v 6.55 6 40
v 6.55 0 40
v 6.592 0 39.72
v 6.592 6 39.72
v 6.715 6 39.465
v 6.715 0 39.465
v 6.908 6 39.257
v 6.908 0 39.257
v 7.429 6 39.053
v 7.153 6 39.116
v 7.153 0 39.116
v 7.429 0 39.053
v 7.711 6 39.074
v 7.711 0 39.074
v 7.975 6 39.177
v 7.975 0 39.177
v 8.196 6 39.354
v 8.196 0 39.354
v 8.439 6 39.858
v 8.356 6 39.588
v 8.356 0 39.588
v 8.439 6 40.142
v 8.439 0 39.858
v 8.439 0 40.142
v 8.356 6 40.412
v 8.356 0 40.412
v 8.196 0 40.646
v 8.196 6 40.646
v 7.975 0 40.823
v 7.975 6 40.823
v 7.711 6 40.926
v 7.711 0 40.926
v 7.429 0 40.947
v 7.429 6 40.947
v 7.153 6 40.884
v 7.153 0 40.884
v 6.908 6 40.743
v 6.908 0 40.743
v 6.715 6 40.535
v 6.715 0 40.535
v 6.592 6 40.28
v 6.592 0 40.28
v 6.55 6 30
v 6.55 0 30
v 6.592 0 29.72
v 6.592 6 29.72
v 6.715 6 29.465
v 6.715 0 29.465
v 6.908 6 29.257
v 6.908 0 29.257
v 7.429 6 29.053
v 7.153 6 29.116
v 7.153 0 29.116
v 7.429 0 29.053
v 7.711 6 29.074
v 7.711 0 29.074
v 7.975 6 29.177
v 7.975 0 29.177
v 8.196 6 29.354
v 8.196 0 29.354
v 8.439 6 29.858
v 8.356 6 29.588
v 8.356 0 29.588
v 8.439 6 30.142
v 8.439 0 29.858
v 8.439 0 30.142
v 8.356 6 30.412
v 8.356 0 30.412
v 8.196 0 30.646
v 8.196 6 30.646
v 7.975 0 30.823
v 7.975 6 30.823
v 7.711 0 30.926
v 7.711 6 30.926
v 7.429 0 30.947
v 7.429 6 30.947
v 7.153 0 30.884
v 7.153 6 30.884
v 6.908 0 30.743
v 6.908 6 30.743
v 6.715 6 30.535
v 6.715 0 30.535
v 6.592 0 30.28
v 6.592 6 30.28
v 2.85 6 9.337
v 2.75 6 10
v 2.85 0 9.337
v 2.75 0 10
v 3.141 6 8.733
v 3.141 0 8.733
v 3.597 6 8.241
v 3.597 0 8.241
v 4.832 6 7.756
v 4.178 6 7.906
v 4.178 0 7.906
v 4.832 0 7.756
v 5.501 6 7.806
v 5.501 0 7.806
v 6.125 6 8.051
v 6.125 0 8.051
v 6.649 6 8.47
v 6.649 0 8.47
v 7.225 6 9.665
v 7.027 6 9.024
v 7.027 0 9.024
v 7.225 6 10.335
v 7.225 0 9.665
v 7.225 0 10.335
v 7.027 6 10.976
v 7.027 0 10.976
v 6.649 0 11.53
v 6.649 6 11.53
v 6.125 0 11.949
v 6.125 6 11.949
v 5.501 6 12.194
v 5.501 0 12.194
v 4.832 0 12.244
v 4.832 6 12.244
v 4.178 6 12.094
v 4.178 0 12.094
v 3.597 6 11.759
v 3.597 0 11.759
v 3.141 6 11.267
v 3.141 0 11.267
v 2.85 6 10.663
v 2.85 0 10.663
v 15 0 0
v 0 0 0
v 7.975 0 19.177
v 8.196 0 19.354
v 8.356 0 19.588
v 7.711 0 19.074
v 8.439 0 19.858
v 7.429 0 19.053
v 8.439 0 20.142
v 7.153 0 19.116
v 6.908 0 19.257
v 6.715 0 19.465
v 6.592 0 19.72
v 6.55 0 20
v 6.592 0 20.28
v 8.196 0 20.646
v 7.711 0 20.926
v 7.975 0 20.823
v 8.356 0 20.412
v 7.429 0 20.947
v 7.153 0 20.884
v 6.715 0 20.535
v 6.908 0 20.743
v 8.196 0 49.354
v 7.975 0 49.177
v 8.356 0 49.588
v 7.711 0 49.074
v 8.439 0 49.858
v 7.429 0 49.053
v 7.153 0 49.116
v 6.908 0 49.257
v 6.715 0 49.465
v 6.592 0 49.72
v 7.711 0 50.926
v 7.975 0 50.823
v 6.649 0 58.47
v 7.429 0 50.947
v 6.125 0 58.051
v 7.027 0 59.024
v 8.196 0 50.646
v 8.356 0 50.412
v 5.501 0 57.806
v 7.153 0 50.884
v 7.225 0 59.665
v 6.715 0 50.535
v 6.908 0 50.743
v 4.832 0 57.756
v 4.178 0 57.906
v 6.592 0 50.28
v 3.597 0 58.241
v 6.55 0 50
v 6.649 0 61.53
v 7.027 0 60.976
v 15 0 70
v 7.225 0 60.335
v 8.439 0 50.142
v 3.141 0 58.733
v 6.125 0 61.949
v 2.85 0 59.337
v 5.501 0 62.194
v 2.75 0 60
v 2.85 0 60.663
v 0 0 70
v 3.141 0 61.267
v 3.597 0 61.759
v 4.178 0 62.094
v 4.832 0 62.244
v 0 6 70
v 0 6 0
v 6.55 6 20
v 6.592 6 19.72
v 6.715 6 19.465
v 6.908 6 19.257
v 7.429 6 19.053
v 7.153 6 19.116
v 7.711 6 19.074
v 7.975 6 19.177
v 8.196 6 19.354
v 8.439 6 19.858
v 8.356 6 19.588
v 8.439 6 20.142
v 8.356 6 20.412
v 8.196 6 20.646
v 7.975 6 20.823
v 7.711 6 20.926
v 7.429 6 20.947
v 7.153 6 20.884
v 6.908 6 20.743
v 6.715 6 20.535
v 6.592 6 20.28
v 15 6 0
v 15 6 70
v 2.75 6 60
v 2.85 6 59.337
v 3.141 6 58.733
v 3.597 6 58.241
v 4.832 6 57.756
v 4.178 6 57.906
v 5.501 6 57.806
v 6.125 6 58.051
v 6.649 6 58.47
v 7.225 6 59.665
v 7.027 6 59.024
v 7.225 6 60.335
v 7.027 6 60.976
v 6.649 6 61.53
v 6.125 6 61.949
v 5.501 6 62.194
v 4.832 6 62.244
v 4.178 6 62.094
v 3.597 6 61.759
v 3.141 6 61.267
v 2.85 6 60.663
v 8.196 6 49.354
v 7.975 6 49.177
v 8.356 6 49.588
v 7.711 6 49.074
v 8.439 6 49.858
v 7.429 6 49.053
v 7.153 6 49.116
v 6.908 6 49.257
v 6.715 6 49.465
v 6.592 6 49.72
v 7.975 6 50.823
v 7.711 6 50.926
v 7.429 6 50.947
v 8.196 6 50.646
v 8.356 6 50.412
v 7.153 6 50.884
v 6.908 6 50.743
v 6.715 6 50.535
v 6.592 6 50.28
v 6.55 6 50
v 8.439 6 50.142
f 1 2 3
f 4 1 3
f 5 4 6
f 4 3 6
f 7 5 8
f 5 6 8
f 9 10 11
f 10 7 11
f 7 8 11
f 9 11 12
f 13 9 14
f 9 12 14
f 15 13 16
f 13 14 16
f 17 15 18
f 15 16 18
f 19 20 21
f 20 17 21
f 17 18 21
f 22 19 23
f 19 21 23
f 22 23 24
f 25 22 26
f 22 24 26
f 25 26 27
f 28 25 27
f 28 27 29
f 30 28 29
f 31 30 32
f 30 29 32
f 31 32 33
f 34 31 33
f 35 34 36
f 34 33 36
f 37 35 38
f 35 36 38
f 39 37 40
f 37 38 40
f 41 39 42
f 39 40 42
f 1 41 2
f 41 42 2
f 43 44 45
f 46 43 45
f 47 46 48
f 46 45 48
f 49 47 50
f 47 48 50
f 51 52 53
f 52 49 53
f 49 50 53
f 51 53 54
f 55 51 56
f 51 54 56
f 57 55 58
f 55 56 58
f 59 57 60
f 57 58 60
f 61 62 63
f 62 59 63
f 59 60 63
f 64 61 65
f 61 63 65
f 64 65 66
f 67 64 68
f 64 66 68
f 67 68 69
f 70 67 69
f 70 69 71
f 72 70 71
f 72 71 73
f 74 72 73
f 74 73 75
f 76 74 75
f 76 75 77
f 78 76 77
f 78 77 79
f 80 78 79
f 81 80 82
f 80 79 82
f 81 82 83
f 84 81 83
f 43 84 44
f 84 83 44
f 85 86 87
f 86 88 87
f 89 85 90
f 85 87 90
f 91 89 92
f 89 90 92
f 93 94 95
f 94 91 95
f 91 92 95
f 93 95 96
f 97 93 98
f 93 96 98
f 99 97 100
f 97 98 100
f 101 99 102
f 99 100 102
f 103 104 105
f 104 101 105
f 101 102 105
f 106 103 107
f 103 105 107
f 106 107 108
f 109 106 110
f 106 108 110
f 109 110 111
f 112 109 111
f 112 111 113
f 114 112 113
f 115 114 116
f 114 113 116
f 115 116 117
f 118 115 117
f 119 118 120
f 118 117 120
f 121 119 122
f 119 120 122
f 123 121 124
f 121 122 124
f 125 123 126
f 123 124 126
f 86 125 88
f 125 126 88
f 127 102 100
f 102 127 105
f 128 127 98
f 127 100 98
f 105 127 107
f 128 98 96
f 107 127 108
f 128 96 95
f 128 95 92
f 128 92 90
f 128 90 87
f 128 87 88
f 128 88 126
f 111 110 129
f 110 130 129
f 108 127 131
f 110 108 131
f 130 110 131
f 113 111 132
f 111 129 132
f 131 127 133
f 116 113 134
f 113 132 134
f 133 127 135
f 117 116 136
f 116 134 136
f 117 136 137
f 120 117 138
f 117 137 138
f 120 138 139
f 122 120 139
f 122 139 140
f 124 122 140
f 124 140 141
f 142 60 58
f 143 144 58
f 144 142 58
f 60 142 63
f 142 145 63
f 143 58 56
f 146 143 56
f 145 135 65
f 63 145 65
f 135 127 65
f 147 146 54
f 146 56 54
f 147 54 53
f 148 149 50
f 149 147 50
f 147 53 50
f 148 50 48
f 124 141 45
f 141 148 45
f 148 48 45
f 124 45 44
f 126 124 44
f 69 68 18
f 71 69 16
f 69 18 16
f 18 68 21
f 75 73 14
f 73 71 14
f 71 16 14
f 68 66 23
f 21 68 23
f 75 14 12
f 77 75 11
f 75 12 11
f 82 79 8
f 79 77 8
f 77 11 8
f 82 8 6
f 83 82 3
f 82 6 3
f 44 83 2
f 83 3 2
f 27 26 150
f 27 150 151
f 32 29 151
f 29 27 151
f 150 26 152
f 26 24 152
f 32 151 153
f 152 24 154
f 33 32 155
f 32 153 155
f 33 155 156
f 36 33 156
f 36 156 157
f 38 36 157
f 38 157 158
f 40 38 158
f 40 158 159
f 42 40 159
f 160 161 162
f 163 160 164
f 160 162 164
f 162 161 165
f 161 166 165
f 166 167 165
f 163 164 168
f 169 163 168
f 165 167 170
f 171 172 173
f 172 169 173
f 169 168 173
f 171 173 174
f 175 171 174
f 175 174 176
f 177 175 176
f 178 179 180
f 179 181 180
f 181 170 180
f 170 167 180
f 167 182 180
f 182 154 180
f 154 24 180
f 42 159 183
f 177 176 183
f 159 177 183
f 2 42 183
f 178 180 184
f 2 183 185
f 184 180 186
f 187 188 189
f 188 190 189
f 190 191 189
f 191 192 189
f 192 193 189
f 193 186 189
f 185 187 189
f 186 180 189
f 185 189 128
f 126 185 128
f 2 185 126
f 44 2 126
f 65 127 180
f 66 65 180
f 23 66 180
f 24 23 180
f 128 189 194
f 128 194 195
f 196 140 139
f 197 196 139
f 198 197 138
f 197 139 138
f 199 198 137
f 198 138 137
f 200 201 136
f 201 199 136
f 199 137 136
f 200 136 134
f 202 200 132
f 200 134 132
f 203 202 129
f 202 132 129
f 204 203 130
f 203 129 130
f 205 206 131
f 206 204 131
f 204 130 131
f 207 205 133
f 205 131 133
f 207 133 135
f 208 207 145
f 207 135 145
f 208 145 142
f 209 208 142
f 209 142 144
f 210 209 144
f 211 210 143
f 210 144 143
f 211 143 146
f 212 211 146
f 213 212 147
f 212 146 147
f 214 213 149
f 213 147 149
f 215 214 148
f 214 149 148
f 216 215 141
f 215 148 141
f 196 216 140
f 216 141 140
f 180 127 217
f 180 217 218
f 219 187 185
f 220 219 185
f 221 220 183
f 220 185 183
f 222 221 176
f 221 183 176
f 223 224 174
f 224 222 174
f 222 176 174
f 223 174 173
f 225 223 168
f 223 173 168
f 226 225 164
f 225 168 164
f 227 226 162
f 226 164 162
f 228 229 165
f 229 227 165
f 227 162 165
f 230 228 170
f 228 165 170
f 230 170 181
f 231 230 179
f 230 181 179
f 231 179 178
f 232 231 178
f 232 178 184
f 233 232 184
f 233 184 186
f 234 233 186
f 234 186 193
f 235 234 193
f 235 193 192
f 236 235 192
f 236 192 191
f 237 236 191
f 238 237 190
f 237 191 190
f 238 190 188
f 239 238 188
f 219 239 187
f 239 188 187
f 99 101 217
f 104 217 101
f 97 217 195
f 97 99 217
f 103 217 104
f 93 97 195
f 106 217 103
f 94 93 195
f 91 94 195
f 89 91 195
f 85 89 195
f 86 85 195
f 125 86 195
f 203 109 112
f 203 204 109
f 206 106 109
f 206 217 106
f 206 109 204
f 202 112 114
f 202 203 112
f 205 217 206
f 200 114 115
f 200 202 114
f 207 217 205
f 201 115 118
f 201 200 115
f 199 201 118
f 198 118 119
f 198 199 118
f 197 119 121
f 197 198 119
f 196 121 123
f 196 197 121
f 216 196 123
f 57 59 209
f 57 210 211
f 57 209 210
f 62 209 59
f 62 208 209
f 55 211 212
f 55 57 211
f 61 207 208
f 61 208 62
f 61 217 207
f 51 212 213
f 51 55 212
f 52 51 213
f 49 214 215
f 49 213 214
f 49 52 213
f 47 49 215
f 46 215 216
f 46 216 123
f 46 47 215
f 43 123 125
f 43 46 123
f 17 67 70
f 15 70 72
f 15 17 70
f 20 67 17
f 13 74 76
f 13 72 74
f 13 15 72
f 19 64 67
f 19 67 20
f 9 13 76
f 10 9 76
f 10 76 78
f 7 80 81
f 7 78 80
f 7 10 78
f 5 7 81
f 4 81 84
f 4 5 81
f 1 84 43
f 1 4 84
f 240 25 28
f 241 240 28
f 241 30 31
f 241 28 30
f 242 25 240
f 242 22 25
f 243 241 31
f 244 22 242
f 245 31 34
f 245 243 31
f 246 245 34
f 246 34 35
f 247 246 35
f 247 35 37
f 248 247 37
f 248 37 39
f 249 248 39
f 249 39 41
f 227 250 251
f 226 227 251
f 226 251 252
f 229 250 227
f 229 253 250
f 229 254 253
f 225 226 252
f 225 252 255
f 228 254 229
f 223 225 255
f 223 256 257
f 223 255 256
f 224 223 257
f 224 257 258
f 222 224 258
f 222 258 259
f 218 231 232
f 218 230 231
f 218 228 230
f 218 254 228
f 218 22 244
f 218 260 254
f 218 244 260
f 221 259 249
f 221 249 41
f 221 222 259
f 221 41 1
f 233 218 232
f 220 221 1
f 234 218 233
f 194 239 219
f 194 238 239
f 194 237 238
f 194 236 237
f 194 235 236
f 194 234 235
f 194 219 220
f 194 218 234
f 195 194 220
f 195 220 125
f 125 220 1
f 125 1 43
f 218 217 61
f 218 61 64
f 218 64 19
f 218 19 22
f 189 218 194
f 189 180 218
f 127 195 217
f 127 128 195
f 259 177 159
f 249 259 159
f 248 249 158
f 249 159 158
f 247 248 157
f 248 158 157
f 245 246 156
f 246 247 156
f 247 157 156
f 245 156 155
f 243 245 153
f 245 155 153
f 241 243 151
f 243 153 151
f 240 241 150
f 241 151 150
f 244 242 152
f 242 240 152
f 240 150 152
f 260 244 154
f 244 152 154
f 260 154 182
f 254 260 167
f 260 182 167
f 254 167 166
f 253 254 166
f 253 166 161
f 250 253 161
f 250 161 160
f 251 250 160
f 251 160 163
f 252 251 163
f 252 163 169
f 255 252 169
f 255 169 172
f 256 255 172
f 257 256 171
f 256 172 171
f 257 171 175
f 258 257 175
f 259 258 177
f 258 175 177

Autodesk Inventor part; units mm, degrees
ref_plane "YZ Plane" through (0, 0, 0) normal (1, 0, 0) x (0, 1, 0)
ref_plane "XZ Plane" through (0, 0, 0) normal (0, 1, 0) x (-1, 0, 0)
ref_plane "XY Plane" through (0, 0, 0) normal (0, 0, 1) x (1, 0, 0)
sketch "Sketch2" plane through (0, 0, 0) normal (0, 1, 0) x (-1, 0, 0)
  line L0 (0, 0) -> (-15, 0)
  line L1 (-15, 0) -> (-15, 70)
  line L2 (-15, 70) -> (0, 70)
  line L3 (0, 70) -> (0, 0)
  circle A0 centre (-5, 10) radius 2.25
  circle A1 centre (-5, 60) radius 2.25
  circle A2 centre (-7.5, 20) radius 0.95
  circle A3 centre (-7.5, 30) radius 0.95
  circle A4 centre (-7.5, 40) radius 0.95
  circle A5 centre (-7.5, 50) radius 0.95
  dimension "d76" = 15
  dimension "d78" = 10
  dimension "d79" = 50
  dimension "d80" = 5
  dimension "d81" = 4.5
  dimension "d82" = 10
  dimension "d83" = 1.9
  dimension "d86" = 10
  dimension "d91" = 10
  dimension "d92" = 7.5
extrude "Extrusion2" add sketch "Sketch2" along normal blind 6
properties part number "phone_holder_top_insert" material "Acrylic, Clear"
